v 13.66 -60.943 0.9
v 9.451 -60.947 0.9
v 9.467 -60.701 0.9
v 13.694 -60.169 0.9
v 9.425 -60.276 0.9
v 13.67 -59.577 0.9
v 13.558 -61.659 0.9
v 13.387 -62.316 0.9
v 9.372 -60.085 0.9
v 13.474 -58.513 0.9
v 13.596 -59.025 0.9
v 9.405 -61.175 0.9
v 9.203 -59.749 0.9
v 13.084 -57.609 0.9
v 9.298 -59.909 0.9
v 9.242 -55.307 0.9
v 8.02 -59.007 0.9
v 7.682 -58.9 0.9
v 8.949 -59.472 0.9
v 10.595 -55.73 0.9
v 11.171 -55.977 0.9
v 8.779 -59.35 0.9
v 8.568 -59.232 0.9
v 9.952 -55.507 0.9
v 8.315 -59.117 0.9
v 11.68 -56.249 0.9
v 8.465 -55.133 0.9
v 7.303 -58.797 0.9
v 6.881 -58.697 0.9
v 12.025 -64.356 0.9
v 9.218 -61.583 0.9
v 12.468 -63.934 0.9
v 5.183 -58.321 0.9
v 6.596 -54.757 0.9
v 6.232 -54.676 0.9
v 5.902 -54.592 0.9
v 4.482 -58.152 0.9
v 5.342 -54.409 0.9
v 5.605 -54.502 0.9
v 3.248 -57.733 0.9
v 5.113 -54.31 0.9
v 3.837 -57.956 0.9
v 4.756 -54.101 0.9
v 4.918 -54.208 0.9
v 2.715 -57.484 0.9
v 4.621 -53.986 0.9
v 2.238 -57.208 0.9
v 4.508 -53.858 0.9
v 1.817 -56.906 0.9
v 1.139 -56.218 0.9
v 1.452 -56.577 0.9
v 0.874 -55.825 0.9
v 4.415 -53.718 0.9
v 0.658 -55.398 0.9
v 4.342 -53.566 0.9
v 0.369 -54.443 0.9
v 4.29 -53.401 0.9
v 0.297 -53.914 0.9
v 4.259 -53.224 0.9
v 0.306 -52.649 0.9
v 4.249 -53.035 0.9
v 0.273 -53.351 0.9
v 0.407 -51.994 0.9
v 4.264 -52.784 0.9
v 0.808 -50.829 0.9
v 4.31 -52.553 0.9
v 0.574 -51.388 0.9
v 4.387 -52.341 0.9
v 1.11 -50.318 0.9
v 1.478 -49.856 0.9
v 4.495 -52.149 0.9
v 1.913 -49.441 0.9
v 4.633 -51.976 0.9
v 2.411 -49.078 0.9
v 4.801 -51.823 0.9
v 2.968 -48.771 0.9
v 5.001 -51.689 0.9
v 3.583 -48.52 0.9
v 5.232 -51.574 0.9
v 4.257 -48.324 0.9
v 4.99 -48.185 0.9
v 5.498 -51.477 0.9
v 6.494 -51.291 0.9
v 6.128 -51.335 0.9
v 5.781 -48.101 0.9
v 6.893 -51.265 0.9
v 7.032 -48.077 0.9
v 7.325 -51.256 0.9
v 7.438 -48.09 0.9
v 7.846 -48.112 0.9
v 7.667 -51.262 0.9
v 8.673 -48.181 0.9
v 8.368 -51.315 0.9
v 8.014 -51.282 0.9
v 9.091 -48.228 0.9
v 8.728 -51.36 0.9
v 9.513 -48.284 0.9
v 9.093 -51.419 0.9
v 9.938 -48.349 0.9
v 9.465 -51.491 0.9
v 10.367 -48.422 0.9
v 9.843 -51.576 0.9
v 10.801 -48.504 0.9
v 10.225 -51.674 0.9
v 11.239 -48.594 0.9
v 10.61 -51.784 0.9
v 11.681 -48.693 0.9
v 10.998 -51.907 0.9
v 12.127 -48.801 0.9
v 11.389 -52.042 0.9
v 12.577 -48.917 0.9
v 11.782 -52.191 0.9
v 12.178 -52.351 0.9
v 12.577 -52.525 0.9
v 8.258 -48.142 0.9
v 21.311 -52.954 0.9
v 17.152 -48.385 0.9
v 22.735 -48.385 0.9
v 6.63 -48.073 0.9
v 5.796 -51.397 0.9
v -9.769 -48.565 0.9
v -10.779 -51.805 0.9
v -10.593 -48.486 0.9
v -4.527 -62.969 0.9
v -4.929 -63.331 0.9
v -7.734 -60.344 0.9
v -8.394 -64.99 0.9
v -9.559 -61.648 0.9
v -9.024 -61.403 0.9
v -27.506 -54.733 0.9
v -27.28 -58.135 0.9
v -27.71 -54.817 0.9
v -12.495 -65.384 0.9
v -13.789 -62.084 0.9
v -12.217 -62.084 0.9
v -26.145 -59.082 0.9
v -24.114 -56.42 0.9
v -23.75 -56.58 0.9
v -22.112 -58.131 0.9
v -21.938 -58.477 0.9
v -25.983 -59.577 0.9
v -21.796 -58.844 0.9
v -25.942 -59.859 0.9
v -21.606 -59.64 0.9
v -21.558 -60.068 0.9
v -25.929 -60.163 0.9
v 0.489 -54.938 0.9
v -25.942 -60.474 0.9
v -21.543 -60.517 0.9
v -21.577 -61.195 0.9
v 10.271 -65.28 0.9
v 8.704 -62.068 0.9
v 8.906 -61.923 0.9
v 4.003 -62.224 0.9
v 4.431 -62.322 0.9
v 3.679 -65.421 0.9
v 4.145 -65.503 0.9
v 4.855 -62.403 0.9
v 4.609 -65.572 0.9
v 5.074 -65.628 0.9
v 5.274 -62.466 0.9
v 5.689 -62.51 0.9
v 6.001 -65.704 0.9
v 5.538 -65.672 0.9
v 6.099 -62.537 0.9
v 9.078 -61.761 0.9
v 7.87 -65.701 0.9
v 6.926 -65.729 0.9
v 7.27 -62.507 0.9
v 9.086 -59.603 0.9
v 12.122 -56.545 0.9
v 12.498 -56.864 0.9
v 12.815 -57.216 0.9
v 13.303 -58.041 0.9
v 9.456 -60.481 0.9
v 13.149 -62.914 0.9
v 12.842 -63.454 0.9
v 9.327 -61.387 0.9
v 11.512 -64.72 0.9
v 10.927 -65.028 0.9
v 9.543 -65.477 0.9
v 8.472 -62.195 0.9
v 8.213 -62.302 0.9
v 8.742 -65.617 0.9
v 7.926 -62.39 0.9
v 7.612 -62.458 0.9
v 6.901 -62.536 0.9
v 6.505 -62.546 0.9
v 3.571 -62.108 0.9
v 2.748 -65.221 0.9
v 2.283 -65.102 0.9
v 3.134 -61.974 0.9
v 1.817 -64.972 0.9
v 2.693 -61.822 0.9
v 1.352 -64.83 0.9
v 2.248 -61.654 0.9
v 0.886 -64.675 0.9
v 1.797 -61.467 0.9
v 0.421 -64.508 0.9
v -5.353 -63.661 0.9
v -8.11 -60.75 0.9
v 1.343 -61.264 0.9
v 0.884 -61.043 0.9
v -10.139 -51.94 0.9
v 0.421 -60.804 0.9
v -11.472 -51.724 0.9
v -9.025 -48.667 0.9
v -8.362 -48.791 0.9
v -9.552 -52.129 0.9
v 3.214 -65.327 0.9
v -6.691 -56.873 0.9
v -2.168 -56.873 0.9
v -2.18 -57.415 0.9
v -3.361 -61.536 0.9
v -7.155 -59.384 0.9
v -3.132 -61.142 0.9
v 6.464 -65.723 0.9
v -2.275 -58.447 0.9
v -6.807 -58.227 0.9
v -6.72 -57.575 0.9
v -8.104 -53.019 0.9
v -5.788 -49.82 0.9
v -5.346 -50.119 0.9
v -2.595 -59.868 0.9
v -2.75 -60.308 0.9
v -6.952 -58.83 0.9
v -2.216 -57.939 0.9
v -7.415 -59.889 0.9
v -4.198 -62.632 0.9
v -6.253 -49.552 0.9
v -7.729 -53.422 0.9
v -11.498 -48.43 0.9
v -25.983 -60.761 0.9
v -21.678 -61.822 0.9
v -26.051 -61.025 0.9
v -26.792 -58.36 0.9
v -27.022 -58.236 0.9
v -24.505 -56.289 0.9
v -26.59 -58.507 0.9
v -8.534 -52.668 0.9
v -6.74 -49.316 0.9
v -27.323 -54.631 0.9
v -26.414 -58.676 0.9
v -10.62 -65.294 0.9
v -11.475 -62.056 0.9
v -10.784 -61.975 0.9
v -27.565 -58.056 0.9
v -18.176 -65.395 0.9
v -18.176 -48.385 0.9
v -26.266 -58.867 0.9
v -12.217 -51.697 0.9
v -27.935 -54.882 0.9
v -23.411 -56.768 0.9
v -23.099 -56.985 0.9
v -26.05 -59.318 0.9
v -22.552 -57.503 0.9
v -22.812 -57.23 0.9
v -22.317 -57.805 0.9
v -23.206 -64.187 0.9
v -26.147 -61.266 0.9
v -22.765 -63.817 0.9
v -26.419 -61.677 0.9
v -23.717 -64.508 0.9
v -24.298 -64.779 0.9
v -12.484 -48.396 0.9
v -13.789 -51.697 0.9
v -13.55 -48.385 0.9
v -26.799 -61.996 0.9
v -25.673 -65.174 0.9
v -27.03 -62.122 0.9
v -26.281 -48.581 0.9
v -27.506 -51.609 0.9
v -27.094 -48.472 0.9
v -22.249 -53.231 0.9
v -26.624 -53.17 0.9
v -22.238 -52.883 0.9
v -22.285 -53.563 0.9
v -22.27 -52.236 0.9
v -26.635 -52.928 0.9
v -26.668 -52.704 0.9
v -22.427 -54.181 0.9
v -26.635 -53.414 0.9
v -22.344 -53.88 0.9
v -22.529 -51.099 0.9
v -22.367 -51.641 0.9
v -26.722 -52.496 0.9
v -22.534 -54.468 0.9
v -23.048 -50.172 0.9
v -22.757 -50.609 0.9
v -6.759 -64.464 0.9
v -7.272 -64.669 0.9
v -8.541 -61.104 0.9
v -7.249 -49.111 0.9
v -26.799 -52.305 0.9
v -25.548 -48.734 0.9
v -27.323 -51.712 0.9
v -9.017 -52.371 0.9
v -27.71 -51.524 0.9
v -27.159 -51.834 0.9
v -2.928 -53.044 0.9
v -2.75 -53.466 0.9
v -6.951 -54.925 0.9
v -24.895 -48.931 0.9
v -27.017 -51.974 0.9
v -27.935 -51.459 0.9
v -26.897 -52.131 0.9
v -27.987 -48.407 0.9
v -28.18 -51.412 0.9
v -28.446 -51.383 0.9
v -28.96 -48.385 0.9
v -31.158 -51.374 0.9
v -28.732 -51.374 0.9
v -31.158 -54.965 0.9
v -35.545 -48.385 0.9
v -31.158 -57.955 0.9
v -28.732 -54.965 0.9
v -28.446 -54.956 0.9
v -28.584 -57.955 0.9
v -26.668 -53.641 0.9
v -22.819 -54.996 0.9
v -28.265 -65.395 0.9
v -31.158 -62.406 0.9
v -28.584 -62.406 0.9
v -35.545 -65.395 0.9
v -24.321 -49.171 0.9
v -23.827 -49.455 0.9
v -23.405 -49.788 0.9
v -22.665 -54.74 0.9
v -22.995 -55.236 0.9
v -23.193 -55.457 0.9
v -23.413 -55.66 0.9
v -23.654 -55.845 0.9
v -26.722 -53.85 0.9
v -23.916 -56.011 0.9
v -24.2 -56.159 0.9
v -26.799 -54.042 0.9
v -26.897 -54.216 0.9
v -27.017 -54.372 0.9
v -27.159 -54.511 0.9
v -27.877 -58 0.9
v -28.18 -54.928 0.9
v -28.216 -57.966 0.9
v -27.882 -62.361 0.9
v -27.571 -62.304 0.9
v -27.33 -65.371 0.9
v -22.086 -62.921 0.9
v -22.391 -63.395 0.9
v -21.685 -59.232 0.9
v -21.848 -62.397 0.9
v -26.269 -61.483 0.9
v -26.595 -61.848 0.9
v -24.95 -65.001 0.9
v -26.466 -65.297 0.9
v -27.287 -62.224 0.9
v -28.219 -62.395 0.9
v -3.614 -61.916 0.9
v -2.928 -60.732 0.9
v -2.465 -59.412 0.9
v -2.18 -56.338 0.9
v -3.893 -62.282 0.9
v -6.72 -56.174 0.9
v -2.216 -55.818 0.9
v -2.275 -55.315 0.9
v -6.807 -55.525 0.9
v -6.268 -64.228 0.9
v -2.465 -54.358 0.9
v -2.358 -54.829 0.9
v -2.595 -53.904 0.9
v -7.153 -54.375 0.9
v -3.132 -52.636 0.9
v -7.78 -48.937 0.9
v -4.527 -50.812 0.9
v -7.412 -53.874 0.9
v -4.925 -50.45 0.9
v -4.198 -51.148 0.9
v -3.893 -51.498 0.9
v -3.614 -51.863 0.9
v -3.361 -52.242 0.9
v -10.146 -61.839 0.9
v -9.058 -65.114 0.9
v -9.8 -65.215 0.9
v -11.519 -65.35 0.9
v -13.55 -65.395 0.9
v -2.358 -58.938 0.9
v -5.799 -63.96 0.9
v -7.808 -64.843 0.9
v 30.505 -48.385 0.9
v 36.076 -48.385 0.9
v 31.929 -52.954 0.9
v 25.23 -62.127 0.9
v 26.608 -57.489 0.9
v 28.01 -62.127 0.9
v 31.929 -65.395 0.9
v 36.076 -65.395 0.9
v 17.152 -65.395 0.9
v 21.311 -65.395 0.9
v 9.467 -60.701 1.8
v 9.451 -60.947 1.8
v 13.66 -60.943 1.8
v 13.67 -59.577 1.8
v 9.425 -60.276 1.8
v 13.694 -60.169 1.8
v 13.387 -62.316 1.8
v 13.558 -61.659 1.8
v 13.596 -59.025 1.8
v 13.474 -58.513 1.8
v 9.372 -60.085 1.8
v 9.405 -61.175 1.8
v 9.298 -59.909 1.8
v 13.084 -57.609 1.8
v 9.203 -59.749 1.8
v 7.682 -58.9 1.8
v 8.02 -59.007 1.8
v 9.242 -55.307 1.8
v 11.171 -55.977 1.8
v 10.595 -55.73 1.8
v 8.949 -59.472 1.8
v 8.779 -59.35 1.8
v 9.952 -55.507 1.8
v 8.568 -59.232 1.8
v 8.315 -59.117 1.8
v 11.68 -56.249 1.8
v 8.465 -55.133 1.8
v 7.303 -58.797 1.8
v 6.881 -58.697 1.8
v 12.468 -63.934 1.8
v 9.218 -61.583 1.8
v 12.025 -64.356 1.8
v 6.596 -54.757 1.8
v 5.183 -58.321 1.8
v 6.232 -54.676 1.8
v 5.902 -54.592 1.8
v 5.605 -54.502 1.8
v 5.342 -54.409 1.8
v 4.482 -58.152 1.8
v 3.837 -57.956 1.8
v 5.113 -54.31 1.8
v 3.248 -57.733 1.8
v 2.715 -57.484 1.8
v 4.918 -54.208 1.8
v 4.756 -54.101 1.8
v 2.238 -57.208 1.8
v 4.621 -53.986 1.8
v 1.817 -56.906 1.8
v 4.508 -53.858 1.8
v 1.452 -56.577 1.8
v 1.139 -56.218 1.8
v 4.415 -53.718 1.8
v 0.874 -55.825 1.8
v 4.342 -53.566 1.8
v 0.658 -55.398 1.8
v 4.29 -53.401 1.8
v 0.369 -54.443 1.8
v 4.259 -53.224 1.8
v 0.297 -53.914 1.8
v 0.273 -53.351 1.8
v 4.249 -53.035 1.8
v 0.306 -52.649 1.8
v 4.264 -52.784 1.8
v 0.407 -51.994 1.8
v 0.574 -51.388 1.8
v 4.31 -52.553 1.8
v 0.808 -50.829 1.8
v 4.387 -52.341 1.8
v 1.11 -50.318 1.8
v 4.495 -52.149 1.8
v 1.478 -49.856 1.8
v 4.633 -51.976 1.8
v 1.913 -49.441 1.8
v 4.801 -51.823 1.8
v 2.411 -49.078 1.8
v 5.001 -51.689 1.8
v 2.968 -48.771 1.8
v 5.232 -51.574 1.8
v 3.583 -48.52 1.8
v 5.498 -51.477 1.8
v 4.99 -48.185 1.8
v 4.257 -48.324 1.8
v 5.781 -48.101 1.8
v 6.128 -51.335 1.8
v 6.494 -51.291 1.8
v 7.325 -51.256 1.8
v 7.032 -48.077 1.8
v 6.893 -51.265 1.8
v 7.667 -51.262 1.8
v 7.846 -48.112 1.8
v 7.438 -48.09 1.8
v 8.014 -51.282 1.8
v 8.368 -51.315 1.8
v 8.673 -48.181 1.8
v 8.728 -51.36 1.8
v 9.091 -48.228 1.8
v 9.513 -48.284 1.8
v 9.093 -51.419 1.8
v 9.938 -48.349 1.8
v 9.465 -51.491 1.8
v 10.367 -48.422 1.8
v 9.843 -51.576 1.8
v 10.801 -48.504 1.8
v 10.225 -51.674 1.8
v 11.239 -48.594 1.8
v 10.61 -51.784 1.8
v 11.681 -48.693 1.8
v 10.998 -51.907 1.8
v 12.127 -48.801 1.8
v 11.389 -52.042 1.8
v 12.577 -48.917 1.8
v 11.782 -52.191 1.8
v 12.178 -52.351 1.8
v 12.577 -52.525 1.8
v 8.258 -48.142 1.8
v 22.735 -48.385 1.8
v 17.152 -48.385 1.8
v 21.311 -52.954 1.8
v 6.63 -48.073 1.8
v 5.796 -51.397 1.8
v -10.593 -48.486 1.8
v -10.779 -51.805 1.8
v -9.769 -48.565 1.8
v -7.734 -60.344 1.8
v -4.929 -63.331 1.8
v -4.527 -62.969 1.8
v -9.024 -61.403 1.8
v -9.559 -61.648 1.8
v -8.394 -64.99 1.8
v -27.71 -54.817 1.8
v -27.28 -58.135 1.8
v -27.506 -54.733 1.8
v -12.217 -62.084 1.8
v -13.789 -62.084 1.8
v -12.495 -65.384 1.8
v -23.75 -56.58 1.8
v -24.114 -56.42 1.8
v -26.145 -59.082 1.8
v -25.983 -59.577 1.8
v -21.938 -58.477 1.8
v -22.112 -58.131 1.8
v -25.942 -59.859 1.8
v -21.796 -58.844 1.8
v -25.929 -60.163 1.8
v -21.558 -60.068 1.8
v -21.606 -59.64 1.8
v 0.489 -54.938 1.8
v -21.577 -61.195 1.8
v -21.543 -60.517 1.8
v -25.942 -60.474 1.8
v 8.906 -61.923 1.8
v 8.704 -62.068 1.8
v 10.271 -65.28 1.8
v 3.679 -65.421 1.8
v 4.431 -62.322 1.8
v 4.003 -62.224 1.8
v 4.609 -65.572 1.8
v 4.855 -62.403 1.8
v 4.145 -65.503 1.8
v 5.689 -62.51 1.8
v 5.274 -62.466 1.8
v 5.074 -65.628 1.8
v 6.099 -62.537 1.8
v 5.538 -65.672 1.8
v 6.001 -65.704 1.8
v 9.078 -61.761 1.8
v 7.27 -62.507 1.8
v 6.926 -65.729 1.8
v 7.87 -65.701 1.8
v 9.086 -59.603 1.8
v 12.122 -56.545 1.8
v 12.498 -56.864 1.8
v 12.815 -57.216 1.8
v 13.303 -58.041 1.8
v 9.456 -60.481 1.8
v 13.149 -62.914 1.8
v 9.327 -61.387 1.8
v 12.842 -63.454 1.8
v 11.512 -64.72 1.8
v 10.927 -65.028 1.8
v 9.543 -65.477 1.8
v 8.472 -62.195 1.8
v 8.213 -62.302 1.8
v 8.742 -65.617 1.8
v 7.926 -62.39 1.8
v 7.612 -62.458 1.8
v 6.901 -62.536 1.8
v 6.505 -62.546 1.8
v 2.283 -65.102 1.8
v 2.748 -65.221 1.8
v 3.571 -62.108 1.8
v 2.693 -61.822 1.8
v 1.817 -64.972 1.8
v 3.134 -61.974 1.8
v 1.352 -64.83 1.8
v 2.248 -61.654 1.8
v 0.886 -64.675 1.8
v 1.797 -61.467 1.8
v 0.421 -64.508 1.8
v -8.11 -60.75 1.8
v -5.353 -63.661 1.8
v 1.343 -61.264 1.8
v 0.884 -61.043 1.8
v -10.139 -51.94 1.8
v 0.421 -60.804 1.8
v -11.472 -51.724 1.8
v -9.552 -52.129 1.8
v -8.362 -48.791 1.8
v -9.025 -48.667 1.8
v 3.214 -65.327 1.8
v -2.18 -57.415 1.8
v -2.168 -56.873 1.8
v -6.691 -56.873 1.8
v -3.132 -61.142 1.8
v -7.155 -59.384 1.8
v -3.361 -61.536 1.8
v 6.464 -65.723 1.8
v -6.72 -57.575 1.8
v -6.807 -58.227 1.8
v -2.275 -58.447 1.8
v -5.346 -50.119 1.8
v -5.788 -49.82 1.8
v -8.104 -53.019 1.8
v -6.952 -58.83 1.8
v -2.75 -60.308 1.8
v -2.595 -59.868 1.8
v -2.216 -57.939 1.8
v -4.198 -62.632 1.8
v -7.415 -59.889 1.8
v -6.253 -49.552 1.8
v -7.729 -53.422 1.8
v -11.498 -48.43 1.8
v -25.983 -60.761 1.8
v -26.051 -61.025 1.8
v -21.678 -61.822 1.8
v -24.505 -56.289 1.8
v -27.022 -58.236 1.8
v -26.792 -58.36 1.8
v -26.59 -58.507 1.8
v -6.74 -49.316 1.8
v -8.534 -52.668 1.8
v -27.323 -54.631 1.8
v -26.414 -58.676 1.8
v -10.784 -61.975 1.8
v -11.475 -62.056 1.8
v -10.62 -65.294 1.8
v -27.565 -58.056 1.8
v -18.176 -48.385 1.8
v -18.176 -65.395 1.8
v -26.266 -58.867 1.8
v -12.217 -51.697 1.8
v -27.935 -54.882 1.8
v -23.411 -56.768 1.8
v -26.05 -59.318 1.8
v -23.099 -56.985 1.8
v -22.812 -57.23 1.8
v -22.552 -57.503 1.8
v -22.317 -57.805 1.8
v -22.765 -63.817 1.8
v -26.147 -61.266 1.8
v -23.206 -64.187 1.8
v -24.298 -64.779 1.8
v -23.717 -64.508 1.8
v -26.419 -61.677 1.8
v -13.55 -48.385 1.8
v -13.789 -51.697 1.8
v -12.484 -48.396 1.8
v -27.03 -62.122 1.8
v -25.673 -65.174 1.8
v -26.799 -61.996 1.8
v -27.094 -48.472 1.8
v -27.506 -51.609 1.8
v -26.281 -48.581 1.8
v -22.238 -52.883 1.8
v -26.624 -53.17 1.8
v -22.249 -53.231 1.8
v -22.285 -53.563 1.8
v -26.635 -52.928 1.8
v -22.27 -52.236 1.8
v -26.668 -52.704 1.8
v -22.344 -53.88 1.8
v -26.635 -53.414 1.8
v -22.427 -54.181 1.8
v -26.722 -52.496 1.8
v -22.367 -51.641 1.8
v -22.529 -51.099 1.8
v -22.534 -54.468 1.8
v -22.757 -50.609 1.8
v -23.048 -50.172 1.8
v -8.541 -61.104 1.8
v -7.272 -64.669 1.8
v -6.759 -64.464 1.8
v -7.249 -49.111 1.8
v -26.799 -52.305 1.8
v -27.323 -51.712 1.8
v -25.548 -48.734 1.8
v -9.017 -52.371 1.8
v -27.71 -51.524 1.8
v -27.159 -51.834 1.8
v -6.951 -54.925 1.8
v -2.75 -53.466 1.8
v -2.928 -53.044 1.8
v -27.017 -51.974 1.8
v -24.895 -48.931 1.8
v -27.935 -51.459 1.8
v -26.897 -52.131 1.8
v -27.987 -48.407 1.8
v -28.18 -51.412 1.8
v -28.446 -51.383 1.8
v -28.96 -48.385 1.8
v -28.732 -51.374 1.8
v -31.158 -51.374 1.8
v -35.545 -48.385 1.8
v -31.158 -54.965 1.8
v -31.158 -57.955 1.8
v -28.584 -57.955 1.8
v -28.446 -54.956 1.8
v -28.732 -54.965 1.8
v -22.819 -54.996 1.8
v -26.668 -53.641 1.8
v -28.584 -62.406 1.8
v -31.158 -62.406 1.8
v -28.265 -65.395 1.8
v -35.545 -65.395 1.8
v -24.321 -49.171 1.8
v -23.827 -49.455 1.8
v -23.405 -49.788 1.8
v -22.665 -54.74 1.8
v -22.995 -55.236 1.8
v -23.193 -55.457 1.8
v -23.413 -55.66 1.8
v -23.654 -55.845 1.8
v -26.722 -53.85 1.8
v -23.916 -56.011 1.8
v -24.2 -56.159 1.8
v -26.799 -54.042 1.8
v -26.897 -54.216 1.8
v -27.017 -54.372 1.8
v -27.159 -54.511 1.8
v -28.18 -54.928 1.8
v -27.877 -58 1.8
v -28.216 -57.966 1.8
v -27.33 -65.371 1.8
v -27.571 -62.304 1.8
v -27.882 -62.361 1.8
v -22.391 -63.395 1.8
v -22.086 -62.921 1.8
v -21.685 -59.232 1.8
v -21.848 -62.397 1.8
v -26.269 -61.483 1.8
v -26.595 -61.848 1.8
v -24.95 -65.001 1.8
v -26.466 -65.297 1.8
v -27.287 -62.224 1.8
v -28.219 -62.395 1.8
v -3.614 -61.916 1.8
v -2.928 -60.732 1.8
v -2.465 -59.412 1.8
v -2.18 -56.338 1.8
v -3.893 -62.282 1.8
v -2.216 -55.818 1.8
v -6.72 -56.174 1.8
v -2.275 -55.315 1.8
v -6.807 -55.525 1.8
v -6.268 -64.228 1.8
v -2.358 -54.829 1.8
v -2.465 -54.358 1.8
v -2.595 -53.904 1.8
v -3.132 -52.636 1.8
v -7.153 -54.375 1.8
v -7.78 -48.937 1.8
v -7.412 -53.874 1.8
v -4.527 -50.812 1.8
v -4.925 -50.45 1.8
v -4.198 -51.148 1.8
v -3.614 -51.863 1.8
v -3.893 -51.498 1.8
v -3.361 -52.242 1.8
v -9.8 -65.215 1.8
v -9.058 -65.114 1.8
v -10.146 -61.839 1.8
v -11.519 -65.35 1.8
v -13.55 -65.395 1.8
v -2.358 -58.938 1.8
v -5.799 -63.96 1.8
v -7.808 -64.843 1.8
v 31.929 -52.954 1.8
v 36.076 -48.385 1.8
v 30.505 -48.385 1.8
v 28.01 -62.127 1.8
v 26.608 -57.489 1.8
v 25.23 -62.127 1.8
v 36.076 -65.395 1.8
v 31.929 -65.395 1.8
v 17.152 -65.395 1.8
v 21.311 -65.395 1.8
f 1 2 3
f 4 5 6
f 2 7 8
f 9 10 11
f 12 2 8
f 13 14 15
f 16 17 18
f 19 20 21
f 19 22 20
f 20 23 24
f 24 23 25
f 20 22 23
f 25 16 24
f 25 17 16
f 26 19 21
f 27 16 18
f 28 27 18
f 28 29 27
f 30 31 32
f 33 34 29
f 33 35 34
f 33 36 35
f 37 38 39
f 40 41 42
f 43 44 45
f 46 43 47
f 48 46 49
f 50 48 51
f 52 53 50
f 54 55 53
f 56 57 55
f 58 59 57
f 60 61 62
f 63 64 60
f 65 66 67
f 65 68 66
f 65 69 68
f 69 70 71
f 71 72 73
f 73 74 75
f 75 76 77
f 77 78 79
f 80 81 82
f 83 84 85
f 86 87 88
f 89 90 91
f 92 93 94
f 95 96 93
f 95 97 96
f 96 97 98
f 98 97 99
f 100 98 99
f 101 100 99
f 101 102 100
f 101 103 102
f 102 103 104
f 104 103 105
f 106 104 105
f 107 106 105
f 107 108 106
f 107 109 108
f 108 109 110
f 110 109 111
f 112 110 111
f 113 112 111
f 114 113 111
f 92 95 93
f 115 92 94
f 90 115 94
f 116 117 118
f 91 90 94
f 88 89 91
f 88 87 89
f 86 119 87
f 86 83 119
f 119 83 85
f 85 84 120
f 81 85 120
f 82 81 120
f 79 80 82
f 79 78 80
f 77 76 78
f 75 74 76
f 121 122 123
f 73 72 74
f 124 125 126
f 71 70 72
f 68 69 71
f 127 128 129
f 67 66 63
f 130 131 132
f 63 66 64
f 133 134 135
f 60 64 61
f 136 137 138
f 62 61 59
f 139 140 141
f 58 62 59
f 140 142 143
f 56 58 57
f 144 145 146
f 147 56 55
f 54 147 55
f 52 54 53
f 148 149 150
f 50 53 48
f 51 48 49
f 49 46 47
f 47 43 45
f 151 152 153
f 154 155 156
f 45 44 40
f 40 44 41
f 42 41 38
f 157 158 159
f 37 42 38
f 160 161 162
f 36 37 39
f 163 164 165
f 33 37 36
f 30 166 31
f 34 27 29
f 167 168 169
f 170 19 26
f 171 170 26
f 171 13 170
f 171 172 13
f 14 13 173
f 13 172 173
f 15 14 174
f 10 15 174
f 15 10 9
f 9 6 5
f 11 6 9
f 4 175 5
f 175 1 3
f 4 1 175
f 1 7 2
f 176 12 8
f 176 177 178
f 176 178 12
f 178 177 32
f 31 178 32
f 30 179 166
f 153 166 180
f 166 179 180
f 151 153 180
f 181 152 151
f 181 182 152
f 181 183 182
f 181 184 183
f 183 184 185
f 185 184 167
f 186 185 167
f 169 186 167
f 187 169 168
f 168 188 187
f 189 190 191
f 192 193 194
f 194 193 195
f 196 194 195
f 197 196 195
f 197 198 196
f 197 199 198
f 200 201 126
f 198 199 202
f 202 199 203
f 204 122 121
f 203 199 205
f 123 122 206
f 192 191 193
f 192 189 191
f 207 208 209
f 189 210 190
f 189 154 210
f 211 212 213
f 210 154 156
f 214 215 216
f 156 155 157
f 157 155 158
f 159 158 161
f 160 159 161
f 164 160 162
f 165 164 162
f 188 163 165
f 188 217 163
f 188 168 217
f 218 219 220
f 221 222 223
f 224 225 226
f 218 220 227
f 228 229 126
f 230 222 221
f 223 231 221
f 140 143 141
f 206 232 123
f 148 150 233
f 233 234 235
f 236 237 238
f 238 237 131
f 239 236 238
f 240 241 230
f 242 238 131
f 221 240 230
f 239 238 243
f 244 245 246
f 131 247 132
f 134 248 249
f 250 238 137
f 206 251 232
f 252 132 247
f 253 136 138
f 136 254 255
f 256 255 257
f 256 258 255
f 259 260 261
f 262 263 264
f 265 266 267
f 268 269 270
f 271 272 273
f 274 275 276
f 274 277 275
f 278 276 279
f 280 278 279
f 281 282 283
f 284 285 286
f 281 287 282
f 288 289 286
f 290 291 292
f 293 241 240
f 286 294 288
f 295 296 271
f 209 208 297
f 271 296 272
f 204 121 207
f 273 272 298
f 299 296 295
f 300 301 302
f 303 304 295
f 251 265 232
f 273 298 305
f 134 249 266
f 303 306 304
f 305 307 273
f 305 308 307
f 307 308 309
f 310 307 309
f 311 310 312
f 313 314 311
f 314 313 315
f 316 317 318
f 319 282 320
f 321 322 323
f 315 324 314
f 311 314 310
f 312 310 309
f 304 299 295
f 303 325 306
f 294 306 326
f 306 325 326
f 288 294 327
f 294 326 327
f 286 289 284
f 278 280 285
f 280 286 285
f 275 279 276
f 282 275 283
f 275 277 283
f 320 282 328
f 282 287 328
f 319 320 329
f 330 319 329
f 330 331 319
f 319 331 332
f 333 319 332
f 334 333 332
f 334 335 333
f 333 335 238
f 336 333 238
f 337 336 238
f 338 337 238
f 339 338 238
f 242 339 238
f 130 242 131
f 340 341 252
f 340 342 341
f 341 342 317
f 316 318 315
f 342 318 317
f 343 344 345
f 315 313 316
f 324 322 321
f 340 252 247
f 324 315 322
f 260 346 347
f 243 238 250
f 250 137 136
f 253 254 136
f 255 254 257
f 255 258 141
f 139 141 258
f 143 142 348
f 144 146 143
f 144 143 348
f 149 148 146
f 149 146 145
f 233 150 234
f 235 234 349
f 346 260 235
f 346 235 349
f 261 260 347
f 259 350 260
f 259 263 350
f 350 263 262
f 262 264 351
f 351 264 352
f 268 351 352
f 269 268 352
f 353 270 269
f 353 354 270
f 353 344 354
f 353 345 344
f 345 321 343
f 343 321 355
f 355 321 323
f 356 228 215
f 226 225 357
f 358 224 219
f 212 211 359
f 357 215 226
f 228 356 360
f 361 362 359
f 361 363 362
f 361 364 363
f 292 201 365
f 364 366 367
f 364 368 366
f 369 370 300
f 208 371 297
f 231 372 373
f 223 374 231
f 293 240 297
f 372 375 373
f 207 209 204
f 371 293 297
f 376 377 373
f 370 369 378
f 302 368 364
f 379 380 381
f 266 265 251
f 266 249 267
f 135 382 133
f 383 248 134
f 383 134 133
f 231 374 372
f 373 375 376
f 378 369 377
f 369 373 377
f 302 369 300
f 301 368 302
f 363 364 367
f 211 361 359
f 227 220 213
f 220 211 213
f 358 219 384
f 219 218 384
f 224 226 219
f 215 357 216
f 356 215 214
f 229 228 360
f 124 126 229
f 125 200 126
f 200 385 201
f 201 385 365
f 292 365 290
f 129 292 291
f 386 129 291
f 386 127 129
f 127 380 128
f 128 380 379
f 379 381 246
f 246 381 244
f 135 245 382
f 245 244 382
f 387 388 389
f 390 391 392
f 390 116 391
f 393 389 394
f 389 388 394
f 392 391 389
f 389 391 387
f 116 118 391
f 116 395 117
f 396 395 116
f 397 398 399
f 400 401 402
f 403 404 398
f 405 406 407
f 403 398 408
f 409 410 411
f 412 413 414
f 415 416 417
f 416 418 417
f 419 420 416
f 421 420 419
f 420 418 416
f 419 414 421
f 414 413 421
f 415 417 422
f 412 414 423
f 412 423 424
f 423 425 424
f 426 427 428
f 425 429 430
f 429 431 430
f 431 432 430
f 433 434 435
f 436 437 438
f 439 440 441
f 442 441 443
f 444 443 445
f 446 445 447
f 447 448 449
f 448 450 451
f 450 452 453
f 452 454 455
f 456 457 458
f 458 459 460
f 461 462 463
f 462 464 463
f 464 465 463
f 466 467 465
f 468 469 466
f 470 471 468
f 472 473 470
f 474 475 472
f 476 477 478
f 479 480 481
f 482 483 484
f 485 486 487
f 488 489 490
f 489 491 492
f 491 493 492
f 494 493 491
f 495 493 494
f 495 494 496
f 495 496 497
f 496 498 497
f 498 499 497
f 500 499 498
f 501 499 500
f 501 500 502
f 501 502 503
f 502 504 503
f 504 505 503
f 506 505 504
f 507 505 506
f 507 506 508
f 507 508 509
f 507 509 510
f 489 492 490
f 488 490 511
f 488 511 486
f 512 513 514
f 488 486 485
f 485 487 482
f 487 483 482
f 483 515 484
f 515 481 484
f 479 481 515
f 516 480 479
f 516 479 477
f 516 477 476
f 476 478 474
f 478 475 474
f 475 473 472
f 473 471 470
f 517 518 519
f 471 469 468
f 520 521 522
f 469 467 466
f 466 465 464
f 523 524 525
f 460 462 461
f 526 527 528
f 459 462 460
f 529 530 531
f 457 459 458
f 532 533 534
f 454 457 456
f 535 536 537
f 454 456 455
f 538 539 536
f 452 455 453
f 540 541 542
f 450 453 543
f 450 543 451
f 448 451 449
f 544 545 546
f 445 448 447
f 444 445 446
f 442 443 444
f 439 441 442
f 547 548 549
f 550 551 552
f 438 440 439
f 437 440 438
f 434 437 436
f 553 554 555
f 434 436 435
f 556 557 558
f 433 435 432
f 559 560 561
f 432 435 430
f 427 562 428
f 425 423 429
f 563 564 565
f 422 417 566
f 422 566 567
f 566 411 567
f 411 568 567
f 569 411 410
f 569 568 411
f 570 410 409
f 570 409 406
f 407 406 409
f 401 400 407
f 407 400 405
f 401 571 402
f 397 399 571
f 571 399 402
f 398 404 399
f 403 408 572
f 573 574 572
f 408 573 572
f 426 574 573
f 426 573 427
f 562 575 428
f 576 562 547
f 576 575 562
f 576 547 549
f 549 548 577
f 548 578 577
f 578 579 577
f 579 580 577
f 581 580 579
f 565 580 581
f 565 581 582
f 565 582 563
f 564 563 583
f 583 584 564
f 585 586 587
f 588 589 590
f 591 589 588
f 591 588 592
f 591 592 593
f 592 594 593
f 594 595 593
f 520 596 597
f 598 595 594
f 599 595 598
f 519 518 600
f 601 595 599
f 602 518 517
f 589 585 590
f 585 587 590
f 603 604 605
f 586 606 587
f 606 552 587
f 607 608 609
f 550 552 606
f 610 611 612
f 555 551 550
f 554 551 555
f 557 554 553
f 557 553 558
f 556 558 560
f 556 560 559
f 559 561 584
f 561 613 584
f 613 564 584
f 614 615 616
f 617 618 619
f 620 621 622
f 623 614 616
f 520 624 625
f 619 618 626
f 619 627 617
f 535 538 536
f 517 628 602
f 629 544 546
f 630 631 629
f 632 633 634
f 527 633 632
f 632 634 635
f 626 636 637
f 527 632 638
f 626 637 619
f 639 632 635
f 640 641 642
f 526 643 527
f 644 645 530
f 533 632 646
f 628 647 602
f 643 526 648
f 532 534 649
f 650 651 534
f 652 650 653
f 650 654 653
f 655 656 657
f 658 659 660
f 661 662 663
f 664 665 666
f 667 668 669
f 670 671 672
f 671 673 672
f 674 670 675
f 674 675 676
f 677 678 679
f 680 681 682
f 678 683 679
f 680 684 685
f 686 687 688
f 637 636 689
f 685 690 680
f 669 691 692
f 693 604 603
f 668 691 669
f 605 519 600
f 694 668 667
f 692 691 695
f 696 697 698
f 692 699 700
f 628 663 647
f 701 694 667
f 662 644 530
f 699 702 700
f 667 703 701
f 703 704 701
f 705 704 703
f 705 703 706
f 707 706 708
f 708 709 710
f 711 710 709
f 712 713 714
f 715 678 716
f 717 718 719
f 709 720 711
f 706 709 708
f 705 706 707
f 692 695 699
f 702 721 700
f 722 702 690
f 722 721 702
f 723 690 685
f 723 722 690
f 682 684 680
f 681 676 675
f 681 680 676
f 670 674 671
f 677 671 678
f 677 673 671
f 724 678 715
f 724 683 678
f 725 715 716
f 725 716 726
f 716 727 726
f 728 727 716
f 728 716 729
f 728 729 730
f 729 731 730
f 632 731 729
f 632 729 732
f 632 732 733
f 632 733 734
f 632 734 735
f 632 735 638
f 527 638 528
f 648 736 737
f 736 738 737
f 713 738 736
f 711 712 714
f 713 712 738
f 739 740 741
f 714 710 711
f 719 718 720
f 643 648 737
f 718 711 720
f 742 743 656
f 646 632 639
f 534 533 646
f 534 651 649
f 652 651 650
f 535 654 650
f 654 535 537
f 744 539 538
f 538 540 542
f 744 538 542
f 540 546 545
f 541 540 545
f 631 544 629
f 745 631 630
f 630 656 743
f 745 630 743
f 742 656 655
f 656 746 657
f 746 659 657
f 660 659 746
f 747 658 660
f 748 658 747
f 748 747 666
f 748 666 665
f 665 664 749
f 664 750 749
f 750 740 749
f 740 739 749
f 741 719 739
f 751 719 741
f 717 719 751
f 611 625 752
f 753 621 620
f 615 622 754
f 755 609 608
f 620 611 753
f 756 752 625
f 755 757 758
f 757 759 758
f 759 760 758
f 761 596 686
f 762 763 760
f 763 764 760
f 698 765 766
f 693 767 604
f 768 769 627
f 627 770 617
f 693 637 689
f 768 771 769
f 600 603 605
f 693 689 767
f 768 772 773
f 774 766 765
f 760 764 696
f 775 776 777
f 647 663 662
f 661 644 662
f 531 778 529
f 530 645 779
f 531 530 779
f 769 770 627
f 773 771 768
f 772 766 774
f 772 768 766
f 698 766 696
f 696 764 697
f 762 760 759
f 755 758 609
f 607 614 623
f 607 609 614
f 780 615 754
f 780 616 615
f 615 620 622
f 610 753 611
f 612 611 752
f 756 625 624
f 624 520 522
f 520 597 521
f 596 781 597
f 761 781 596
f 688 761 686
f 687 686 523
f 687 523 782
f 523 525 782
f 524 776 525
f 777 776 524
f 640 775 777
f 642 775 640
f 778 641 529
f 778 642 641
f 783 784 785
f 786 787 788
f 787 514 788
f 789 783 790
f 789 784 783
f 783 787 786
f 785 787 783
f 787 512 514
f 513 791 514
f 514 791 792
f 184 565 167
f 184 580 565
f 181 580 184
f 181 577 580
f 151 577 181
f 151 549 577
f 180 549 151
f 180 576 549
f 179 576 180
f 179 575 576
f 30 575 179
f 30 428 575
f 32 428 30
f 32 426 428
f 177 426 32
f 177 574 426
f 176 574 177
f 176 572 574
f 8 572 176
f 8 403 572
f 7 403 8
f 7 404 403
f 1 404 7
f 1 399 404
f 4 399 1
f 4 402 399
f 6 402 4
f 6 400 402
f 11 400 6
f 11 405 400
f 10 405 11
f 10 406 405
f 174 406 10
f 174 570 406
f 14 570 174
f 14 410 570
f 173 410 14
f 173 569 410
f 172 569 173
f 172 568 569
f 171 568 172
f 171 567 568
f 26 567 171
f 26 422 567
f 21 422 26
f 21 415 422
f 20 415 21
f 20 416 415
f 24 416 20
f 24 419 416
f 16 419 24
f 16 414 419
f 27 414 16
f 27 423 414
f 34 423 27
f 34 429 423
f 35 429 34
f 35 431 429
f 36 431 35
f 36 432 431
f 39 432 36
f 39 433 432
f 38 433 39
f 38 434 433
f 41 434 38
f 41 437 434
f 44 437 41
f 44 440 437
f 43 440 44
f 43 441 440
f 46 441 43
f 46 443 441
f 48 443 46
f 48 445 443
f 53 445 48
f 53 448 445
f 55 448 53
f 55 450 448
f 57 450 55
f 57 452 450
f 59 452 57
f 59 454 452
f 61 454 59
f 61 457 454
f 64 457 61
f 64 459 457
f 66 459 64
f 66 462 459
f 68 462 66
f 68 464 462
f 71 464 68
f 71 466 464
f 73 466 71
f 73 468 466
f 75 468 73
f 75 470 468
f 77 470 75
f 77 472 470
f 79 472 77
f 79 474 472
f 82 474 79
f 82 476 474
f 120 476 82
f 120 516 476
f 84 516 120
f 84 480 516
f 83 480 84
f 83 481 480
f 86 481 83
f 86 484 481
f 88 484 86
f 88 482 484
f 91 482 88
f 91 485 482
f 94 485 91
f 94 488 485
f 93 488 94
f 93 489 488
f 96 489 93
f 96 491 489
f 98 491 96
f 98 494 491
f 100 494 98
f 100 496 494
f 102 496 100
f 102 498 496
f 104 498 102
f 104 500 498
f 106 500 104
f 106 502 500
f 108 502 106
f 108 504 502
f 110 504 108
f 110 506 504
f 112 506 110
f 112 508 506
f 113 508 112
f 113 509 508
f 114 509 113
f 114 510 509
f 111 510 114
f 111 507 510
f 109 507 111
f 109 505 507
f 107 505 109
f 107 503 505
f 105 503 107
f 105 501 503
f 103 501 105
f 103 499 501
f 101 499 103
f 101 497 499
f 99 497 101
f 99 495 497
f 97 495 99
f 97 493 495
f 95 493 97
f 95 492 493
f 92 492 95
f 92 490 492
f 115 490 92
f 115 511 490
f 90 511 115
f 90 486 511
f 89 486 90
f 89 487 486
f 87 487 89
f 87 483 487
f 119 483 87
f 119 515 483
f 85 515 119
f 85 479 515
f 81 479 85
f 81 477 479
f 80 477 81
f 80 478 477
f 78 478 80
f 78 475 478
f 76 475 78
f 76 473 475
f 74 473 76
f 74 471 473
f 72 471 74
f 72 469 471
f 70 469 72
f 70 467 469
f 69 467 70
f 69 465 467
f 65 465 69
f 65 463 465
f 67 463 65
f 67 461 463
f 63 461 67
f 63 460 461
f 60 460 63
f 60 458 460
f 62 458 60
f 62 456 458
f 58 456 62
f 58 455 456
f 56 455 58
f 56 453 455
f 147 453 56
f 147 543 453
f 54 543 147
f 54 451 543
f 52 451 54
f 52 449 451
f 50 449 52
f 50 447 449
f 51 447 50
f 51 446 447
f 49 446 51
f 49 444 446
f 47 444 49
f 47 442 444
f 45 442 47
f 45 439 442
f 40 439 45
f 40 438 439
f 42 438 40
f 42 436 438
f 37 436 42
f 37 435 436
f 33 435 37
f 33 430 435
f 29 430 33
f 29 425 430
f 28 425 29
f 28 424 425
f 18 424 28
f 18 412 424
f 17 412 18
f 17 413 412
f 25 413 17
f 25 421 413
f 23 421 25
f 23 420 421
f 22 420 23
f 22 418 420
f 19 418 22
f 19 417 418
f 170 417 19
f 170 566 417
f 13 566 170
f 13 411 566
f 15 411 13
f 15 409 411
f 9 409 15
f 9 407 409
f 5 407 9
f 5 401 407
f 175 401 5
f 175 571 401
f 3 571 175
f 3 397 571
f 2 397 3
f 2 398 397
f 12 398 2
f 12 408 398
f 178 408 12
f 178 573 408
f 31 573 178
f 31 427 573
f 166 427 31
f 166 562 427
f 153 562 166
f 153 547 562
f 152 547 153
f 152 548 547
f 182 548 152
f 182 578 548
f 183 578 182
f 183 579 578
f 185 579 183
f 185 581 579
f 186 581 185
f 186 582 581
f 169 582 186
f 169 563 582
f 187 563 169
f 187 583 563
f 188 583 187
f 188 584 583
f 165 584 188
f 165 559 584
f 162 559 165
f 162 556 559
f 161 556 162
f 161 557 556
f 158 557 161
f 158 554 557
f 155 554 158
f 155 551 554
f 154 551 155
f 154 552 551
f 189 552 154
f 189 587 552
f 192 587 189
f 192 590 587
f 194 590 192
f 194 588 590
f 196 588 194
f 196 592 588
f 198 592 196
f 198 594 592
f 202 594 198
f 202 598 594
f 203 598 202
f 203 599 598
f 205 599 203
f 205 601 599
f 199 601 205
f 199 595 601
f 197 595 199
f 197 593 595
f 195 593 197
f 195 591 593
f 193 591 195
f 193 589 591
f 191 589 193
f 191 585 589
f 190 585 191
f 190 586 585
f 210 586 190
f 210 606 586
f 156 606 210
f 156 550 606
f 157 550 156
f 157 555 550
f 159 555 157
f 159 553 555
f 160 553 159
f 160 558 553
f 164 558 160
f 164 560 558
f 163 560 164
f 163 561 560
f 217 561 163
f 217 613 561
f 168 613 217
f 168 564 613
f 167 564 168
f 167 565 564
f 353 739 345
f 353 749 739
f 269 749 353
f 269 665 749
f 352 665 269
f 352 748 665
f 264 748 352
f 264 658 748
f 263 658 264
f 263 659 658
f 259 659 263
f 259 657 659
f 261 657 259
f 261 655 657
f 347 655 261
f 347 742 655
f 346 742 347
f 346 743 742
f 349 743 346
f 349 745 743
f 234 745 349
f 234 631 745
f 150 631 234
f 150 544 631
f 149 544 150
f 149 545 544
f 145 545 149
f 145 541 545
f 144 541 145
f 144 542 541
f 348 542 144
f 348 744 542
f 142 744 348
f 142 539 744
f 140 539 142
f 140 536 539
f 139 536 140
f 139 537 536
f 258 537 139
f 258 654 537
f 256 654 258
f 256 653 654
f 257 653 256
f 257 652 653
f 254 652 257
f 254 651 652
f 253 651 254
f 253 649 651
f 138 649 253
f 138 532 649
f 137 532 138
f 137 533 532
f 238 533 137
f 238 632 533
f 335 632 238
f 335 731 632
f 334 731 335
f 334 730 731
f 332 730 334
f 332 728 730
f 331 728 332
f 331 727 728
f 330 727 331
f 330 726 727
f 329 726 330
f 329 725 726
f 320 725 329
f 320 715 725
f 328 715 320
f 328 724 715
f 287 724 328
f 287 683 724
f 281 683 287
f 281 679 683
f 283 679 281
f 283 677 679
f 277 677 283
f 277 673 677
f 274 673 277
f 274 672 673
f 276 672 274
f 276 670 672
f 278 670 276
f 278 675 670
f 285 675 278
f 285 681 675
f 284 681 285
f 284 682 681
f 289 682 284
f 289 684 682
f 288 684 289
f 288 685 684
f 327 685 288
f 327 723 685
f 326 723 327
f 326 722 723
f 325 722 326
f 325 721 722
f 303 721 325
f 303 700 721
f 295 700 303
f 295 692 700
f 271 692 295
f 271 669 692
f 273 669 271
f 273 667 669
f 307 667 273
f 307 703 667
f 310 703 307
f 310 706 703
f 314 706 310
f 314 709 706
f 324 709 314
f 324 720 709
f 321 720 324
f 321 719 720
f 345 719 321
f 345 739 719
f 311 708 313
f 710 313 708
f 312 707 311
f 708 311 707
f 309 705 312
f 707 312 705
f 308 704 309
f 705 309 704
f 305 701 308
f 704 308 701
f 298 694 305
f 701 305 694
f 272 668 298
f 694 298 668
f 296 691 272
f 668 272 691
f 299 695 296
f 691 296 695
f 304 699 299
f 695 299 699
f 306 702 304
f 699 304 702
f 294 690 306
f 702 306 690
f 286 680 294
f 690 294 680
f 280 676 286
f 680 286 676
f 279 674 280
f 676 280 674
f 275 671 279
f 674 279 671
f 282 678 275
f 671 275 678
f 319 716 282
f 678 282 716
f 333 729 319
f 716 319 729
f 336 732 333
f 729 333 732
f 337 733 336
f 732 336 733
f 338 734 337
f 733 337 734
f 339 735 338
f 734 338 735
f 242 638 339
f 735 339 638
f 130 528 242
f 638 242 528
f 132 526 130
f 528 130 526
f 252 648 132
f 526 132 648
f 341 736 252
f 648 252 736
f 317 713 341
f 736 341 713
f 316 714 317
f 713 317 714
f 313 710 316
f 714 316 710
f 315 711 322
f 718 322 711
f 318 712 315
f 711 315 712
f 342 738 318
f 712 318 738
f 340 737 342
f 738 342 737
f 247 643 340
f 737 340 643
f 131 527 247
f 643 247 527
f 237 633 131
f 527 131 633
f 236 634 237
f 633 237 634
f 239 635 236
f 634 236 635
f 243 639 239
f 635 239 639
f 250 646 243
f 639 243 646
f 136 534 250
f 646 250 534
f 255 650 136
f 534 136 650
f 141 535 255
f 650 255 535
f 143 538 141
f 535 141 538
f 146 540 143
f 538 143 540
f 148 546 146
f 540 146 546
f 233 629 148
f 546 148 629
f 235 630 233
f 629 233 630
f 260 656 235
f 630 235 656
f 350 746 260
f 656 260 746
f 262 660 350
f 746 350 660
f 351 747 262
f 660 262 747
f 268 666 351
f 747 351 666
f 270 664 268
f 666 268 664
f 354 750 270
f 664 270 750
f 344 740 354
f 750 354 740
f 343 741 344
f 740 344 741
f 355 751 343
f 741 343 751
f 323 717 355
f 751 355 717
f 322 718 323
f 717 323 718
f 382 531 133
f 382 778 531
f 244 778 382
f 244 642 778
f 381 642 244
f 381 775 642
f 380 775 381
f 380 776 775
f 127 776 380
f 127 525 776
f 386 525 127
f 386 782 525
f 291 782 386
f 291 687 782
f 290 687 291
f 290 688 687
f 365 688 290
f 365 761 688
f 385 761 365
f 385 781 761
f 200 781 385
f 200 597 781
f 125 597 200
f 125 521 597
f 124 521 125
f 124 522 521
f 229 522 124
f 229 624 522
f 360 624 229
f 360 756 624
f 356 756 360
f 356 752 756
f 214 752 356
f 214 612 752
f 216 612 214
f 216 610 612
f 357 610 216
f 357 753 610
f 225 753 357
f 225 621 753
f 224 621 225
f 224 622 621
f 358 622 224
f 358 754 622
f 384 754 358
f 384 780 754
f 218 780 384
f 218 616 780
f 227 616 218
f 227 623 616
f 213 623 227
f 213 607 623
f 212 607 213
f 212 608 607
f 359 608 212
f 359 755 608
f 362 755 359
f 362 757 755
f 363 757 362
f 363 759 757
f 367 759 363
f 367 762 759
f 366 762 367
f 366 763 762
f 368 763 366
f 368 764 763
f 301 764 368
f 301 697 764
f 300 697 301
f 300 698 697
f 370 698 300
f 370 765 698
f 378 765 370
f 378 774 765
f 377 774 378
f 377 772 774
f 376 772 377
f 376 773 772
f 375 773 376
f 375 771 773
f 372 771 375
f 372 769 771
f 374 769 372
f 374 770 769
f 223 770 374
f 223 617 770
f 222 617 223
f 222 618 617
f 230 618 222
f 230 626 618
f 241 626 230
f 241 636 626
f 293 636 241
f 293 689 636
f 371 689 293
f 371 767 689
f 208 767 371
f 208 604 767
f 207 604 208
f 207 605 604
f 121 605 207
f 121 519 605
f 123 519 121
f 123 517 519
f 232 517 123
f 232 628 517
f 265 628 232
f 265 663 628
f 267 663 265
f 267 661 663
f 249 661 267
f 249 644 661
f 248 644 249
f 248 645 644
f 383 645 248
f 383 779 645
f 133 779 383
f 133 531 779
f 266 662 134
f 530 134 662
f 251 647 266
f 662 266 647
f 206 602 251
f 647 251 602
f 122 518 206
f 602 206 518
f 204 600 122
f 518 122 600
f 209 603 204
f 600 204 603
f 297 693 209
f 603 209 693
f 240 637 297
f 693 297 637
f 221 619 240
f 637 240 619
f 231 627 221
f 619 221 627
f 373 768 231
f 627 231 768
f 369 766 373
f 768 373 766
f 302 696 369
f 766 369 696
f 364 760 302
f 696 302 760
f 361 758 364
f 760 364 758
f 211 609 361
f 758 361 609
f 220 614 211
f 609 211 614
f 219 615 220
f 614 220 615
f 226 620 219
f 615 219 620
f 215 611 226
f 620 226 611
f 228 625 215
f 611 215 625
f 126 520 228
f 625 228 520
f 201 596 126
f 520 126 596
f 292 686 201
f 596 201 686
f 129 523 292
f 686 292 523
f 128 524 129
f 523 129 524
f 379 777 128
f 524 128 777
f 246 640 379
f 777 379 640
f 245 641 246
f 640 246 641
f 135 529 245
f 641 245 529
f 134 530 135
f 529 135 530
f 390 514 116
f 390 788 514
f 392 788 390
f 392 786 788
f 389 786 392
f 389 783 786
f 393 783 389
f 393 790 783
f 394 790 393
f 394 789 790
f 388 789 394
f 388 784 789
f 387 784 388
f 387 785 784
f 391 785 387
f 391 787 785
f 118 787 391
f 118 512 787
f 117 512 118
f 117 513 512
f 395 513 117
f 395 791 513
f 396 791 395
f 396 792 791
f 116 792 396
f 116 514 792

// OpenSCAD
$fn = 48;
  // English (below bottom hole)
  translate([0, -57.100, 0.900]) linear_extrude(height=0.900) text("BDSM", size=16.801, halign="center", valign="center", font="Helvetica Neue:style=Bold");
